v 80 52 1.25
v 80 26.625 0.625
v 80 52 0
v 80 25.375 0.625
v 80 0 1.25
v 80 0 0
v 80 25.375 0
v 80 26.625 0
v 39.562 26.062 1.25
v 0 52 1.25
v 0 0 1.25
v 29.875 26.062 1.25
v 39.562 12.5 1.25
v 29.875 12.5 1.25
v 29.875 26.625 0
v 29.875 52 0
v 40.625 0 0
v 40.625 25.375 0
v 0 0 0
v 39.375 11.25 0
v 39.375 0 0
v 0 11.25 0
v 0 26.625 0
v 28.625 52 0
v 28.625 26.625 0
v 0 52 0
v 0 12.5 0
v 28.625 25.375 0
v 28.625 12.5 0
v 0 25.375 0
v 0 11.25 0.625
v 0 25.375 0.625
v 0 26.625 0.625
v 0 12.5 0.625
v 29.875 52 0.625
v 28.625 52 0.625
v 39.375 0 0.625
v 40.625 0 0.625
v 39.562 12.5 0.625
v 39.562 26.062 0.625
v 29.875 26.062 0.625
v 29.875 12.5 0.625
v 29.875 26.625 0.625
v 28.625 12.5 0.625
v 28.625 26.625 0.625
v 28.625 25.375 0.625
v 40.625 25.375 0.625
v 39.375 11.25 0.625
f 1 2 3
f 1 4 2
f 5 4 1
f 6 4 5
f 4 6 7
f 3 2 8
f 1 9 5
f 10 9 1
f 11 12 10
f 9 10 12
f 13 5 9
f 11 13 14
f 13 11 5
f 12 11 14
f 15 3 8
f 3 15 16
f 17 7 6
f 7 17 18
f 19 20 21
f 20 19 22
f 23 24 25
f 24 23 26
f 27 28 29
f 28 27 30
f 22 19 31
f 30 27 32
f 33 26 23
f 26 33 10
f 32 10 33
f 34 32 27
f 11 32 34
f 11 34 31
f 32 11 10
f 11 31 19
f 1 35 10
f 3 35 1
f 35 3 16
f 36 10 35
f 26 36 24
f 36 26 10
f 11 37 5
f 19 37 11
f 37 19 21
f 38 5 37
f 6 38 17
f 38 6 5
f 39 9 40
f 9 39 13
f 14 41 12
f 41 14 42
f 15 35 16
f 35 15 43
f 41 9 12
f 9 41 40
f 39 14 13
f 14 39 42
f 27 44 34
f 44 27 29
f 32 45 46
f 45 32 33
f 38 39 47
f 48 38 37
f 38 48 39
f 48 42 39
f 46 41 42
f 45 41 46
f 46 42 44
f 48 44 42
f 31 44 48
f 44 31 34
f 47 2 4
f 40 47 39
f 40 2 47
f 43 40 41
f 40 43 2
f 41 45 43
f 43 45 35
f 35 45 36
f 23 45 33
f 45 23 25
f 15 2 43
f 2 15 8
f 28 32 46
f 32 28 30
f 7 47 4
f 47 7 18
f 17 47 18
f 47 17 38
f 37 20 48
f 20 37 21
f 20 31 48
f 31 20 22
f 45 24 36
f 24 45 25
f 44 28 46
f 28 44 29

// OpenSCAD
/*
Projekt Name: Trennwaende für das Modellhaus 3723
Modul:  Zwischendecke mit Halterungen für die WS2812
Projekt URL: https://github.com/Hardi-St/MobaLedLib_Docu/tree/master/3D_Daten_fuer_die_MobaLedLib/Trennwände%20für%20Häuser
Version: 0.0.1
Autor: Moba-Nick (mobanick@wp12085804.server-he.de)
Lizenz: CC-BY-SA-4.0 (https://creativecommons.org/licenses/by-sa/4.0/legalcode.de)
*/
// Alle Angaben sind immer in mm bei meinen Projekten.
//Parameter für die Grundplatte des Hauses
x_grund = 80;       // Laenge der Grundplatte
y_grund = 52;       // Breite der Grundplatte 
z_grund = 1.25;       // Staerke der Grundplatte
z_zwishendecke = z_grund * 0.5; // Hoehe der Zwischendecke

// Parameter für die Staerke der Waende
wand_staerke = 1.25;
/*
    Bitte die drei Formeln nicht aendern. Diese errechnen die zusätzlichen Parameter aus den vorhandenen Weten der Zeilen 10 - 22.
*/
x_all = x_grund;
y_all = y_grund;
z_all = z_grund;

/* 
    Wenn die Zwischendecke_Haus eine Halterung für eine Lampe hat oder ein Kabelschacht eine Oeffnung braucht, kann man hier einen Ausschnitt in der Zwischendecke_Haus dafuer vorsehen und die Position und Groesse angeben.
*/
x_cut = 49.25 - 39.25 - wand_staerke*0.25;  // Laenge der Aussparung
y_cut = 12+wand_staerke*1.25;  // Breite der Aussparung
cut_pos_x = 29.25 +wand_staerke/2; // Punkt X der Aussparung
cut_pos_y = 11.25 + wand_staerke; // Punkt Y der Aussparung 


/*
    Im nachfolgendem Abschnitt wird die Grundplatte und alle Waende erstellt.
    Die Angaben koennen ganz nach belieben abgeaendert werden.
*/
difference(){
    //Erstellen der Zwischendecke sowie dem Loch für den Kabelschacht (true = mit loch, false = ohne Loch)
    Zwischendecke_Haus(true); 
    // Die erste Wand ist die, die von links nach rechts geht und das Haus einmal teilt
    Wand_DIR_Y(0,y_grund/2,x_grund);
        
    // Die zweite Wand geht von der Mitte der Mittelwand bis zur unteren Kante der Grundplatte und teilt den unteren Teil nochmals in zwei Teile.
    Wand_DIR_X(x_grund/2, 0,y_grund/2); 

    //Die dritte Wand geht von der linken Aussenseite bis zur zweiten Wand
    Wand_DIR_Y(0,11.25+wand_staerke/2,40.25);

    //Die vierte und letzte Wand. Diese geht von der oberen Kante zu der dritten Wand.
    Wand_DIR_X(29.25,y_grund - (25.25+1.5+12+1.5),37.75+wand_staerke*2);
}

/* 
!!!!!!!!!!!!!!!!!!!!!!!!!!!!!!!!!!!!!!!!!!!!!!!!!!!!!!!!!!!!!!!!!!!!   
!!!!    Ab hier kommen die Module. Bitte nur aendern wann man   !!!!
!!!!    weiss was man macht.                                    !!!!
!!!!!!!!!!!!!!!!!!!!!!!!!!!!!!!!!!!!!!!!!!!!!!!!!!!!!!!!!!!!!!!!!!!!
/*  
    Das Module Zwischendecke_Haus erstellt die Grundplatte des Hauses inkl. des Aussenrandes um die Grundplatte. Dazu wurde im Bereich für die Parameter in den  Zeilen 10 - 37 die Werte angeben.
*/
module Zwischendecke_Haus(cutting){
        difference(){
            cube([x_grund,y_grund,z_grund],false);
            // Auschnitt aus der Grundplatte vornehmen
            if (cutting == true){
                translate([cut_pos_x,cut_pos_y,0]){
                    cube([x_cut,y_cut,z_all],false);
                }
            }
        }
}

/*
    Das Modul "Wand_DIR_X" erstellt Waende welche auf der X-Achse (von links nach rechts) verschoben werden koennen.
    Die Hoehe ist dabei immer die gesamte Hoehe des Stockwerkes.
    pos_x   => gibt den Startpunkt auf der X-Achse an.
    pos_y   => gibt den Startpunkt auf der Y-Achse an.
    width_x => gibt an wie lang die Wand werden soll..
*/
module Wand_DIR_X(pos_x, pos_y, width_x){
    translate([pos_x -wand_staerke/2,pos_y,0]){
        cube([wand_staerke,width_x, z_zwishendecke]);
    }
}

/*
    Das Modul "Wand_DIR_Y" erstellt Waende welche auf der Y-Achse (von vorne nach hinten) verschoben werden koennen.  
    Die Hoehe ist dabei immer die gesamte Hoehe des Stockwerkes.
    pos_x   => gibt den Startpunkt auf der X-Achse an.
    pos_y   => gibt den Startpunkt auf der Y-Achse an.
    width_y => gibt an wie lang die Wand werden soll..
*/
module Wand_DIR_Y(pos_x, pos_y, width_y){
    translate([pos_x,pos_y - wand_staerke/2,0]){
        cube([width_y,wand_staerke, z_zwishendecke]);
    }
}
